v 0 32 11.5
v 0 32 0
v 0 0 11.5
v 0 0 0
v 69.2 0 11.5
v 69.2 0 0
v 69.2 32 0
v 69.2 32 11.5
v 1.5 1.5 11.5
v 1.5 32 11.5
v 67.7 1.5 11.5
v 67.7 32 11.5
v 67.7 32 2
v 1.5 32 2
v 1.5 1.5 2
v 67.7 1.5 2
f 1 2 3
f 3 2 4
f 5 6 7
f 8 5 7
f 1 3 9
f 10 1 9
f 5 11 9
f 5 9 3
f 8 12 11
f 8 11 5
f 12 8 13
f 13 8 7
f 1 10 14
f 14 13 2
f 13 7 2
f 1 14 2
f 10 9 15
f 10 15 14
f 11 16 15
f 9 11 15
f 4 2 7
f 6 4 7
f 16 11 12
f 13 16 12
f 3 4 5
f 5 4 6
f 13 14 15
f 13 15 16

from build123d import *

# Parameters (mm, degrees)
F0_W     = 69.2
F0_H     = 32
F1_DEPTH = 2
F3_DEPTH = 9.5
F4_W     = 66.2
F4_H     = 1.5
F5_DEPTH = 9.5


with BuildPart() as f1:
    # F0 (on Top) → F1 (new body)
    with BuildSketch(Plane.XY):
        with Locations((34.6, 16)):
            Rectangle(F0_W, F0_H)
    extrude(amount=F1_DEPTH)

    # F2 (on face) → F3 (join)
    with BuildSketch(Plane.XY.offset(2)):
        Polygon((3.5, 32), (0, 32), (0, 0), (69.2, 0), (69.2, 32), (65.7, 32), (65.7, 30.5), (67.7, 30.5), (67.7, 1.5), (1.5, 1.5), (1.5, 30.5), (3.5, 30.5), align=None)
    extrude(amount=F3_DEPTH)

    # F4 (on face) → F5 (cut)
    with BuildSketch(Plane.XY.offset(11.5)):
        with Locations((34.6, 31.25)):
            Rectangle(F4_W, F4_H)
    extrude(amount=-F5_DEPTH, mode=Mode.SUBTRACT)


solid = f1.part
